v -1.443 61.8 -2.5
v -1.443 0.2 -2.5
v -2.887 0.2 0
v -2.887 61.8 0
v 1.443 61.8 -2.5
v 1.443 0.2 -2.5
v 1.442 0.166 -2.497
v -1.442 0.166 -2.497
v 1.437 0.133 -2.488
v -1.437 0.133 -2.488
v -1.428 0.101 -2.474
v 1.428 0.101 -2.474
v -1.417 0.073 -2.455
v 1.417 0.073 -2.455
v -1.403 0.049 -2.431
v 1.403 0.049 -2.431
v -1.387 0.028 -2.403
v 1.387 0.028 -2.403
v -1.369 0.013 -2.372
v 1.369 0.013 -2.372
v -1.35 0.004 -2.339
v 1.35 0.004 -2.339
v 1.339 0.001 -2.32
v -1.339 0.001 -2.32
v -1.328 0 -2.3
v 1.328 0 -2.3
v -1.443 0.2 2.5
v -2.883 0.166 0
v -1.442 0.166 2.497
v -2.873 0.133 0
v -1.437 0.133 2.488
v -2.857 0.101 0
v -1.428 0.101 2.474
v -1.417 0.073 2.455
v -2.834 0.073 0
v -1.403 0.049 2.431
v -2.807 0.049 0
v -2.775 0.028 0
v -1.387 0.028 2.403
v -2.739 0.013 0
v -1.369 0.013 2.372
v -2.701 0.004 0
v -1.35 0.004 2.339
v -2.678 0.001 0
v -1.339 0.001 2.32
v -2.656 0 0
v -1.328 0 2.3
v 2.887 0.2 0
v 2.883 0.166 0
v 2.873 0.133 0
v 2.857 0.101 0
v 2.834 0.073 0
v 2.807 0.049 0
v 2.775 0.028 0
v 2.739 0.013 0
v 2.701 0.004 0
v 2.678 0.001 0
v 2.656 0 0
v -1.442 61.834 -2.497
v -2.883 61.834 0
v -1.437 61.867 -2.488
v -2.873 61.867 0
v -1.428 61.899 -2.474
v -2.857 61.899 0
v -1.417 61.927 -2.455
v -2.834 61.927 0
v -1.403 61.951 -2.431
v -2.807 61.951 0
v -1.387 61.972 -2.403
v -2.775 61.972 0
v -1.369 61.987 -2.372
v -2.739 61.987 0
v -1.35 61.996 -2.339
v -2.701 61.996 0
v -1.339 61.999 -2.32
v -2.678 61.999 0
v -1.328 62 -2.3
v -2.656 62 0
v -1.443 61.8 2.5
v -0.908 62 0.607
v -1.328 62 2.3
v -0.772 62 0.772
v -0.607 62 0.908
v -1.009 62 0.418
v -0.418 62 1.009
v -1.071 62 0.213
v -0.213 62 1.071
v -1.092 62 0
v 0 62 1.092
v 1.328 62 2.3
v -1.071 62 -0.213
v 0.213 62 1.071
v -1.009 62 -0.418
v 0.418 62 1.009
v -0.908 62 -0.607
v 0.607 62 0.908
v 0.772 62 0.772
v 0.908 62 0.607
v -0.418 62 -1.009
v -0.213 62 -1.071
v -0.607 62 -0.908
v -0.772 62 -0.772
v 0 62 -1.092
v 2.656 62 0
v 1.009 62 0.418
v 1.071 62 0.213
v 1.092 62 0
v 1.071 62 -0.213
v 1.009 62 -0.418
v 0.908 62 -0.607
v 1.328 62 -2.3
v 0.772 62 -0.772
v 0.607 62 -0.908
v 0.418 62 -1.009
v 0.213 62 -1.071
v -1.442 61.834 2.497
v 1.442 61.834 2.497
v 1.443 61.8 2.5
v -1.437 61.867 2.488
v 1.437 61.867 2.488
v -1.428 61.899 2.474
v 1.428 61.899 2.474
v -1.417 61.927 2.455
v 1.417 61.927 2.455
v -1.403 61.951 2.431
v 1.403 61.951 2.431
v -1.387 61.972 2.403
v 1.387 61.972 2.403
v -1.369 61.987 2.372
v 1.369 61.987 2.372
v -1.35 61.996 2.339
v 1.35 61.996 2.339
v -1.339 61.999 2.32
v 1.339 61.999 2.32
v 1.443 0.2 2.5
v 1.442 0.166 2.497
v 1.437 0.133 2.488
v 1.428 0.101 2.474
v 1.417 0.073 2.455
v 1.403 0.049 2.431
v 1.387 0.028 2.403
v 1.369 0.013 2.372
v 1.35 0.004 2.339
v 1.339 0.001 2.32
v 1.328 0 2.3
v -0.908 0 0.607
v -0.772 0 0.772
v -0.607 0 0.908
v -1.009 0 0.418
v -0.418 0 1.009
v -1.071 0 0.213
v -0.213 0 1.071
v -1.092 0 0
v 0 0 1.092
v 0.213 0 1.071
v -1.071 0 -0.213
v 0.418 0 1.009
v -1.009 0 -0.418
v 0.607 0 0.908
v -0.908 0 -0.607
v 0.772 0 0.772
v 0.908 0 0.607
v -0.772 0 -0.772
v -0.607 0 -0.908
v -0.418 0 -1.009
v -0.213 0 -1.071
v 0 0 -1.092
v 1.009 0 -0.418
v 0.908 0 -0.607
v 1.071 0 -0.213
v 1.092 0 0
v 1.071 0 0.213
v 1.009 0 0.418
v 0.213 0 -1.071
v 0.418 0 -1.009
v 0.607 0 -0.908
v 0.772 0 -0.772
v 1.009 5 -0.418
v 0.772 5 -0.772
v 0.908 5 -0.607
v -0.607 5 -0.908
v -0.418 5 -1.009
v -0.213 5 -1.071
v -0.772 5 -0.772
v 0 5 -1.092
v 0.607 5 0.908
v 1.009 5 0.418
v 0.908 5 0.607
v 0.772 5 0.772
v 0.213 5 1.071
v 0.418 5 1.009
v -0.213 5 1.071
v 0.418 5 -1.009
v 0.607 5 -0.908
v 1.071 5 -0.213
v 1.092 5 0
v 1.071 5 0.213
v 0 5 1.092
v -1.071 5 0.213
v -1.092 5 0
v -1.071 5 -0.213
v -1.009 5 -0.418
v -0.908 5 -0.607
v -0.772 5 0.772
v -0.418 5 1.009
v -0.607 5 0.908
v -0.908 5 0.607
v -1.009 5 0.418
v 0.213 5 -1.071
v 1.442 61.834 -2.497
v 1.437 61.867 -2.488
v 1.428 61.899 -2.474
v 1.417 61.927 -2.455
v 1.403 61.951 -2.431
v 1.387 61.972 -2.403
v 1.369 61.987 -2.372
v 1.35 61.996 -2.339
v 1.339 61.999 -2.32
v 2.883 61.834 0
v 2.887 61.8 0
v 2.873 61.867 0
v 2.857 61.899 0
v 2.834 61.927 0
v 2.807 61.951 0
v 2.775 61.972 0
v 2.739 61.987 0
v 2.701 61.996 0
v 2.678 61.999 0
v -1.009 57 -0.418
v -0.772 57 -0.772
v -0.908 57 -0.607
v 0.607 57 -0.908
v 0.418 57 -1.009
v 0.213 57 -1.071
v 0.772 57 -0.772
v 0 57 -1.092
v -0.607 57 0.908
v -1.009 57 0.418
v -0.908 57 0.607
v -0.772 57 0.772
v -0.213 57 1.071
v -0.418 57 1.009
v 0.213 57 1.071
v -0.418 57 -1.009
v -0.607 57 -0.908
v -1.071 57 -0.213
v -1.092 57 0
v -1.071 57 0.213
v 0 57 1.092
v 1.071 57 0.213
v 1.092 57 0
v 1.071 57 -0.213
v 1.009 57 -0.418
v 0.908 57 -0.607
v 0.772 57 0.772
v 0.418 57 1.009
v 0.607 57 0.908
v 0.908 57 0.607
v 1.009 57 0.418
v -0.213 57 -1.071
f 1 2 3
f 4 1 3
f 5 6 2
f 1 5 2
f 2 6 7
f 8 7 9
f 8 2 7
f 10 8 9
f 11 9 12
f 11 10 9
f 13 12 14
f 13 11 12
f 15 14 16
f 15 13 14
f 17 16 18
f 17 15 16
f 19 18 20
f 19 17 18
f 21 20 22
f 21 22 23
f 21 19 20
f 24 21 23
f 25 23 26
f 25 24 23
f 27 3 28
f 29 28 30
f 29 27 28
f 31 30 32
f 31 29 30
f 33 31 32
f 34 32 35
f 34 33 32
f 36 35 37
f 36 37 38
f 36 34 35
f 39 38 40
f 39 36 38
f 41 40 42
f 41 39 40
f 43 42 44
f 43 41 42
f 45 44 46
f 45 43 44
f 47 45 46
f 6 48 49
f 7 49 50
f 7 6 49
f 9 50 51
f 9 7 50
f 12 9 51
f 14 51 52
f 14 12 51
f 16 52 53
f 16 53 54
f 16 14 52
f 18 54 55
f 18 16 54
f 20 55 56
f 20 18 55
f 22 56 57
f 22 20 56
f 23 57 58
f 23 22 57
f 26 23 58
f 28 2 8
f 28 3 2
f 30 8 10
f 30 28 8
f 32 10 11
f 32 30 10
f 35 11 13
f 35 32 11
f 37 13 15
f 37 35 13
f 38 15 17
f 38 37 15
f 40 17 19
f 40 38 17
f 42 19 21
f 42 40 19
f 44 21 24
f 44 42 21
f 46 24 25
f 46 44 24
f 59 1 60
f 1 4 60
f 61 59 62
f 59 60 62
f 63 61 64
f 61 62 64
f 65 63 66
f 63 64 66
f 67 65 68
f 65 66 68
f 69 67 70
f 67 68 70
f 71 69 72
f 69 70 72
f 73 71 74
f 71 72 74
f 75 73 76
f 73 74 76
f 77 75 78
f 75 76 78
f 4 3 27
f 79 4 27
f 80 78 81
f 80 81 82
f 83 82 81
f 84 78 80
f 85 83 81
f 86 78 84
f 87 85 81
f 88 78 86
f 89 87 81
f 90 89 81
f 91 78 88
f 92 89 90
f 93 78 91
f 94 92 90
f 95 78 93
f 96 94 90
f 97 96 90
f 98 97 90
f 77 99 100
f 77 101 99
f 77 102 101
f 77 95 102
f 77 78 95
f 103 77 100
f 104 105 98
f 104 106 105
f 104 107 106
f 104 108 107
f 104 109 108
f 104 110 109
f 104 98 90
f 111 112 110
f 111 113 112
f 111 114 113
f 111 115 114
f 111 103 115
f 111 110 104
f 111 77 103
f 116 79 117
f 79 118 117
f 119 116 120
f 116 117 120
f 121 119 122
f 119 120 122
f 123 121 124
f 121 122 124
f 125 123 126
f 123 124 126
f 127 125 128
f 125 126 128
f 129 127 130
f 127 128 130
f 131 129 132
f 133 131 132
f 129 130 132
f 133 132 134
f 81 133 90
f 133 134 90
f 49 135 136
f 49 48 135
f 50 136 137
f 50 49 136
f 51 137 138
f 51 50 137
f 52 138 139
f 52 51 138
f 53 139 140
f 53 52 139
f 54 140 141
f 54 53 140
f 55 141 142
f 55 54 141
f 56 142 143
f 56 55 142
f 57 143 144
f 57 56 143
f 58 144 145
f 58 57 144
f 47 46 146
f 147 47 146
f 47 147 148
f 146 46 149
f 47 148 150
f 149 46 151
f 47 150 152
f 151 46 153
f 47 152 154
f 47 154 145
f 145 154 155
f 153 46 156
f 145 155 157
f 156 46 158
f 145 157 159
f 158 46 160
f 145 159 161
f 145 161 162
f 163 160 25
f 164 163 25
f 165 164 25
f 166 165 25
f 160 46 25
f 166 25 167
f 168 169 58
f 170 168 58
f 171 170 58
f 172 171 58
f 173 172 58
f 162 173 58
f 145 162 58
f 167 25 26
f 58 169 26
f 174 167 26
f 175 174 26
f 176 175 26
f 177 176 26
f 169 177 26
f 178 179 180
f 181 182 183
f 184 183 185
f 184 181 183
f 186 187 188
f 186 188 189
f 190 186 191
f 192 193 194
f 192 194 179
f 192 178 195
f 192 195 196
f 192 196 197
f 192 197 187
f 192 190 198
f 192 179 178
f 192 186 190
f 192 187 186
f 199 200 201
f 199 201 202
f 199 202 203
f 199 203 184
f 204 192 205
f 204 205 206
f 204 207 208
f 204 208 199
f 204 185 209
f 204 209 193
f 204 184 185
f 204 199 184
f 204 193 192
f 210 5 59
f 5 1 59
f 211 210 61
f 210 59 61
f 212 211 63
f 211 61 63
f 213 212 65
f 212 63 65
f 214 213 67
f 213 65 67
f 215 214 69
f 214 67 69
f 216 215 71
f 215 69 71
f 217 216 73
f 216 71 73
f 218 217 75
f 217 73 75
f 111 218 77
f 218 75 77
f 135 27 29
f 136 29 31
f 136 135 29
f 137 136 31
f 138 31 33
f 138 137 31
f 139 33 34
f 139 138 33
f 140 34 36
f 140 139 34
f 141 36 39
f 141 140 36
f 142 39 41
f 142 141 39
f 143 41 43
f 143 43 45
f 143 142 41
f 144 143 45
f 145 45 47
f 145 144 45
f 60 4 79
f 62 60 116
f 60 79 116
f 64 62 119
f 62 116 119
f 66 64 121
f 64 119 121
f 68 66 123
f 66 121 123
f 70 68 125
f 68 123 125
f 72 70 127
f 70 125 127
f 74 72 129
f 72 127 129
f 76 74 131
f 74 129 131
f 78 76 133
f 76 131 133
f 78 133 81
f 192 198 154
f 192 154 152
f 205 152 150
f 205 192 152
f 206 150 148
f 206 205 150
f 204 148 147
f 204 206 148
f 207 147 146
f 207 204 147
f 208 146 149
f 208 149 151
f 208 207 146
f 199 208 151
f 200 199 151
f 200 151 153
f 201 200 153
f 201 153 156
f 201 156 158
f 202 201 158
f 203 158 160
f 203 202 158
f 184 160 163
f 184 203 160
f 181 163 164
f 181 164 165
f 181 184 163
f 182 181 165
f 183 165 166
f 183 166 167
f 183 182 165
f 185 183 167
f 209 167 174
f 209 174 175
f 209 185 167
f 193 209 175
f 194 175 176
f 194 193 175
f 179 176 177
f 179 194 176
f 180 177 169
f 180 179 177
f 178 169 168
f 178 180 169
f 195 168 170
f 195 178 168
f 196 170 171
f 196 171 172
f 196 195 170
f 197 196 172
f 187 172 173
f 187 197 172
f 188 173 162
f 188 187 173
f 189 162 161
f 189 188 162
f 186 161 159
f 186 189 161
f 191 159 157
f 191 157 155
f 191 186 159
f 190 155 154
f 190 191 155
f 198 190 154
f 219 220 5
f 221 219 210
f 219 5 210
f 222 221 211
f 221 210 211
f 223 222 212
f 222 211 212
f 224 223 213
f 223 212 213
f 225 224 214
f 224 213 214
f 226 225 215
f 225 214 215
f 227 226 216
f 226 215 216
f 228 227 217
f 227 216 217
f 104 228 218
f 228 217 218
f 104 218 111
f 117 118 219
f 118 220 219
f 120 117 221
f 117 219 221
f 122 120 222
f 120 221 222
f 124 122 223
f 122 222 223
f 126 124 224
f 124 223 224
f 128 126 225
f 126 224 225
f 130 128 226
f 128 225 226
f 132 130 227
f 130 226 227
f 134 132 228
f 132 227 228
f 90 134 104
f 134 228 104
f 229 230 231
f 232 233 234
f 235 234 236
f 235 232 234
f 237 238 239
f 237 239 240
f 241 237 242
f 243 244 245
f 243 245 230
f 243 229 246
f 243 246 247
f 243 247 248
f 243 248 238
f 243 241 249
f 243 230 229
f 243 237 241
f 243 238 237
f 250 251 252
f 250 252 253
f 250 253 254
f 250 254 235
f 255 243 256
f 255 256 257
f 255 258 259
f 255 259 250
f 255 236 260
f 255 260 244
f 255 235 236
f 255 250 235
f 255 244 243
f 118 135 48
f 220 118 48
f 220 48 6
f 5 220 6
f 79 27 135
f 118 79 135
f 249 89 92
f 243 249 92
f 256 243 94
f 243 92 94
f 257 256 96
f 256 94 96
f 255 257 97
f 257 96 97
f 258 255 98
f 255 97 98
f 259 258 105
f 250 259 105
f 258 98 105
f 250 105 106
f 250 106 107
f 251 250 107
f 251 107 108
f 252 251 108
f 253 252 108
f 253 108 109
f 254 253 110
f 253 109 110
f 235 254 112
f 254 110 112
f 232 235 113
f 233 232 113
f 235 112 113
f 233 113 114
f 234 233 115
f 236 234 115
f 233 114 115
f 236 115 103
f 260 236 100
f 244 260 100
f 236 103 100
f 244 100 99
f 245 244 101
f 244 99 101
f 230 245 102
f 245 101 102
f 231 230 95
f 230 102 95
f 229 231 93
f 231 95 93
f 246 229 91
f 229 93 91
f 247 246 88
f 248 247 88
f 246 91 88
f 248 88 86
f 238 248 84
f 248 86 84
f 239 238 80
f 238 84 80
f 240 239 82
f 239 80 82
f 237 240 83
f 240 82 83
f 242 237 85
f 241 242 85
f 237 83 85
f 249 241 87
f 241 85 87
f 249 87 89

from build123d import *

# Parameters (mm, degrees)
RESSALTO_EXTRUS_O1_DEPTH = 62
FILETE1_R                = 0.2
ESBO_O3_R                = 1.0922
CORTE_EXTRUS_O1_DEPTH    = 5
CORTE_EXTRUS_O2_START    = -5
ESBO_O2_R                = 1.0922
CORTE_EXTRUS_O2_DEPTH    = 5


with BuildPart() as part:
    # Esboço1 → Ressalto-extrusão1 (new body)
    with BuildSketch(Plane(origin=(0, 0, 0), x_dir=(1, 0, 0), z_dir=(0, 1, 0))):
        Polygon((2.886751346, 0), (1.443375673, 2.5), (-1.443375673, 2.5), (-2.886751346, 0), (-1.443375673, -2.5), (1.443375673, -2.5), align=None)
    extrude(amount=RESSALTO_EXTRUS_O1_DEPTH)

    # Filete1
    filete1_edges = [part.edges().sort_by_distance(p)[0] for p in [
        (0, 62, -2.5),
        (-2.165063509, 62, -1.25),
        (-2.165063509, 62, 1.25),
        (0, 62, 2.5),
        (2.165063509, 62, 1.25),
        (0, 0, 2.5),
        (-2.165063509, 0, 1.25),
        (-2.165063509, 0, -1.25),
        (2.165063509, 62, -1.25),
        (0, 0, -2.5),
        (2.165063509, 0, -1.25),
        (2.165063509, 0, 1.25),
    ]]
    fillet(filete1_edges, radius=FILETE1_R)

    # Esboço3 → Corte-extrusão1 (cut)
    with BuildSketch(Plane(origin=(0, 62, 0), x_dir=(1, 0, 0), z_dir=(0, 1, 0))):
        with Locations(Location((0, 0, 0), (0, 0, 270))):
            Circle(ESBO_O3_R)
    extrude(amount=-CORTE_EXTRUS_O1_DEPTH, mode=Mode.SUBTRACT)

    # Esboço2 → Corte-extrusão2 (cut)
    with BuildSketch(Plane.XZ.offset(CORTE_EXTRUS_O2_START)):
        with Locations(Location((0, 0, 0), (0, 0, 90))):
            Circle(ESBO_O2_R)
    extrude(amount=CORTE_EXTRUS_O2_DEPTH, mode=Mode.SUBTRACT)


solid = part.part
